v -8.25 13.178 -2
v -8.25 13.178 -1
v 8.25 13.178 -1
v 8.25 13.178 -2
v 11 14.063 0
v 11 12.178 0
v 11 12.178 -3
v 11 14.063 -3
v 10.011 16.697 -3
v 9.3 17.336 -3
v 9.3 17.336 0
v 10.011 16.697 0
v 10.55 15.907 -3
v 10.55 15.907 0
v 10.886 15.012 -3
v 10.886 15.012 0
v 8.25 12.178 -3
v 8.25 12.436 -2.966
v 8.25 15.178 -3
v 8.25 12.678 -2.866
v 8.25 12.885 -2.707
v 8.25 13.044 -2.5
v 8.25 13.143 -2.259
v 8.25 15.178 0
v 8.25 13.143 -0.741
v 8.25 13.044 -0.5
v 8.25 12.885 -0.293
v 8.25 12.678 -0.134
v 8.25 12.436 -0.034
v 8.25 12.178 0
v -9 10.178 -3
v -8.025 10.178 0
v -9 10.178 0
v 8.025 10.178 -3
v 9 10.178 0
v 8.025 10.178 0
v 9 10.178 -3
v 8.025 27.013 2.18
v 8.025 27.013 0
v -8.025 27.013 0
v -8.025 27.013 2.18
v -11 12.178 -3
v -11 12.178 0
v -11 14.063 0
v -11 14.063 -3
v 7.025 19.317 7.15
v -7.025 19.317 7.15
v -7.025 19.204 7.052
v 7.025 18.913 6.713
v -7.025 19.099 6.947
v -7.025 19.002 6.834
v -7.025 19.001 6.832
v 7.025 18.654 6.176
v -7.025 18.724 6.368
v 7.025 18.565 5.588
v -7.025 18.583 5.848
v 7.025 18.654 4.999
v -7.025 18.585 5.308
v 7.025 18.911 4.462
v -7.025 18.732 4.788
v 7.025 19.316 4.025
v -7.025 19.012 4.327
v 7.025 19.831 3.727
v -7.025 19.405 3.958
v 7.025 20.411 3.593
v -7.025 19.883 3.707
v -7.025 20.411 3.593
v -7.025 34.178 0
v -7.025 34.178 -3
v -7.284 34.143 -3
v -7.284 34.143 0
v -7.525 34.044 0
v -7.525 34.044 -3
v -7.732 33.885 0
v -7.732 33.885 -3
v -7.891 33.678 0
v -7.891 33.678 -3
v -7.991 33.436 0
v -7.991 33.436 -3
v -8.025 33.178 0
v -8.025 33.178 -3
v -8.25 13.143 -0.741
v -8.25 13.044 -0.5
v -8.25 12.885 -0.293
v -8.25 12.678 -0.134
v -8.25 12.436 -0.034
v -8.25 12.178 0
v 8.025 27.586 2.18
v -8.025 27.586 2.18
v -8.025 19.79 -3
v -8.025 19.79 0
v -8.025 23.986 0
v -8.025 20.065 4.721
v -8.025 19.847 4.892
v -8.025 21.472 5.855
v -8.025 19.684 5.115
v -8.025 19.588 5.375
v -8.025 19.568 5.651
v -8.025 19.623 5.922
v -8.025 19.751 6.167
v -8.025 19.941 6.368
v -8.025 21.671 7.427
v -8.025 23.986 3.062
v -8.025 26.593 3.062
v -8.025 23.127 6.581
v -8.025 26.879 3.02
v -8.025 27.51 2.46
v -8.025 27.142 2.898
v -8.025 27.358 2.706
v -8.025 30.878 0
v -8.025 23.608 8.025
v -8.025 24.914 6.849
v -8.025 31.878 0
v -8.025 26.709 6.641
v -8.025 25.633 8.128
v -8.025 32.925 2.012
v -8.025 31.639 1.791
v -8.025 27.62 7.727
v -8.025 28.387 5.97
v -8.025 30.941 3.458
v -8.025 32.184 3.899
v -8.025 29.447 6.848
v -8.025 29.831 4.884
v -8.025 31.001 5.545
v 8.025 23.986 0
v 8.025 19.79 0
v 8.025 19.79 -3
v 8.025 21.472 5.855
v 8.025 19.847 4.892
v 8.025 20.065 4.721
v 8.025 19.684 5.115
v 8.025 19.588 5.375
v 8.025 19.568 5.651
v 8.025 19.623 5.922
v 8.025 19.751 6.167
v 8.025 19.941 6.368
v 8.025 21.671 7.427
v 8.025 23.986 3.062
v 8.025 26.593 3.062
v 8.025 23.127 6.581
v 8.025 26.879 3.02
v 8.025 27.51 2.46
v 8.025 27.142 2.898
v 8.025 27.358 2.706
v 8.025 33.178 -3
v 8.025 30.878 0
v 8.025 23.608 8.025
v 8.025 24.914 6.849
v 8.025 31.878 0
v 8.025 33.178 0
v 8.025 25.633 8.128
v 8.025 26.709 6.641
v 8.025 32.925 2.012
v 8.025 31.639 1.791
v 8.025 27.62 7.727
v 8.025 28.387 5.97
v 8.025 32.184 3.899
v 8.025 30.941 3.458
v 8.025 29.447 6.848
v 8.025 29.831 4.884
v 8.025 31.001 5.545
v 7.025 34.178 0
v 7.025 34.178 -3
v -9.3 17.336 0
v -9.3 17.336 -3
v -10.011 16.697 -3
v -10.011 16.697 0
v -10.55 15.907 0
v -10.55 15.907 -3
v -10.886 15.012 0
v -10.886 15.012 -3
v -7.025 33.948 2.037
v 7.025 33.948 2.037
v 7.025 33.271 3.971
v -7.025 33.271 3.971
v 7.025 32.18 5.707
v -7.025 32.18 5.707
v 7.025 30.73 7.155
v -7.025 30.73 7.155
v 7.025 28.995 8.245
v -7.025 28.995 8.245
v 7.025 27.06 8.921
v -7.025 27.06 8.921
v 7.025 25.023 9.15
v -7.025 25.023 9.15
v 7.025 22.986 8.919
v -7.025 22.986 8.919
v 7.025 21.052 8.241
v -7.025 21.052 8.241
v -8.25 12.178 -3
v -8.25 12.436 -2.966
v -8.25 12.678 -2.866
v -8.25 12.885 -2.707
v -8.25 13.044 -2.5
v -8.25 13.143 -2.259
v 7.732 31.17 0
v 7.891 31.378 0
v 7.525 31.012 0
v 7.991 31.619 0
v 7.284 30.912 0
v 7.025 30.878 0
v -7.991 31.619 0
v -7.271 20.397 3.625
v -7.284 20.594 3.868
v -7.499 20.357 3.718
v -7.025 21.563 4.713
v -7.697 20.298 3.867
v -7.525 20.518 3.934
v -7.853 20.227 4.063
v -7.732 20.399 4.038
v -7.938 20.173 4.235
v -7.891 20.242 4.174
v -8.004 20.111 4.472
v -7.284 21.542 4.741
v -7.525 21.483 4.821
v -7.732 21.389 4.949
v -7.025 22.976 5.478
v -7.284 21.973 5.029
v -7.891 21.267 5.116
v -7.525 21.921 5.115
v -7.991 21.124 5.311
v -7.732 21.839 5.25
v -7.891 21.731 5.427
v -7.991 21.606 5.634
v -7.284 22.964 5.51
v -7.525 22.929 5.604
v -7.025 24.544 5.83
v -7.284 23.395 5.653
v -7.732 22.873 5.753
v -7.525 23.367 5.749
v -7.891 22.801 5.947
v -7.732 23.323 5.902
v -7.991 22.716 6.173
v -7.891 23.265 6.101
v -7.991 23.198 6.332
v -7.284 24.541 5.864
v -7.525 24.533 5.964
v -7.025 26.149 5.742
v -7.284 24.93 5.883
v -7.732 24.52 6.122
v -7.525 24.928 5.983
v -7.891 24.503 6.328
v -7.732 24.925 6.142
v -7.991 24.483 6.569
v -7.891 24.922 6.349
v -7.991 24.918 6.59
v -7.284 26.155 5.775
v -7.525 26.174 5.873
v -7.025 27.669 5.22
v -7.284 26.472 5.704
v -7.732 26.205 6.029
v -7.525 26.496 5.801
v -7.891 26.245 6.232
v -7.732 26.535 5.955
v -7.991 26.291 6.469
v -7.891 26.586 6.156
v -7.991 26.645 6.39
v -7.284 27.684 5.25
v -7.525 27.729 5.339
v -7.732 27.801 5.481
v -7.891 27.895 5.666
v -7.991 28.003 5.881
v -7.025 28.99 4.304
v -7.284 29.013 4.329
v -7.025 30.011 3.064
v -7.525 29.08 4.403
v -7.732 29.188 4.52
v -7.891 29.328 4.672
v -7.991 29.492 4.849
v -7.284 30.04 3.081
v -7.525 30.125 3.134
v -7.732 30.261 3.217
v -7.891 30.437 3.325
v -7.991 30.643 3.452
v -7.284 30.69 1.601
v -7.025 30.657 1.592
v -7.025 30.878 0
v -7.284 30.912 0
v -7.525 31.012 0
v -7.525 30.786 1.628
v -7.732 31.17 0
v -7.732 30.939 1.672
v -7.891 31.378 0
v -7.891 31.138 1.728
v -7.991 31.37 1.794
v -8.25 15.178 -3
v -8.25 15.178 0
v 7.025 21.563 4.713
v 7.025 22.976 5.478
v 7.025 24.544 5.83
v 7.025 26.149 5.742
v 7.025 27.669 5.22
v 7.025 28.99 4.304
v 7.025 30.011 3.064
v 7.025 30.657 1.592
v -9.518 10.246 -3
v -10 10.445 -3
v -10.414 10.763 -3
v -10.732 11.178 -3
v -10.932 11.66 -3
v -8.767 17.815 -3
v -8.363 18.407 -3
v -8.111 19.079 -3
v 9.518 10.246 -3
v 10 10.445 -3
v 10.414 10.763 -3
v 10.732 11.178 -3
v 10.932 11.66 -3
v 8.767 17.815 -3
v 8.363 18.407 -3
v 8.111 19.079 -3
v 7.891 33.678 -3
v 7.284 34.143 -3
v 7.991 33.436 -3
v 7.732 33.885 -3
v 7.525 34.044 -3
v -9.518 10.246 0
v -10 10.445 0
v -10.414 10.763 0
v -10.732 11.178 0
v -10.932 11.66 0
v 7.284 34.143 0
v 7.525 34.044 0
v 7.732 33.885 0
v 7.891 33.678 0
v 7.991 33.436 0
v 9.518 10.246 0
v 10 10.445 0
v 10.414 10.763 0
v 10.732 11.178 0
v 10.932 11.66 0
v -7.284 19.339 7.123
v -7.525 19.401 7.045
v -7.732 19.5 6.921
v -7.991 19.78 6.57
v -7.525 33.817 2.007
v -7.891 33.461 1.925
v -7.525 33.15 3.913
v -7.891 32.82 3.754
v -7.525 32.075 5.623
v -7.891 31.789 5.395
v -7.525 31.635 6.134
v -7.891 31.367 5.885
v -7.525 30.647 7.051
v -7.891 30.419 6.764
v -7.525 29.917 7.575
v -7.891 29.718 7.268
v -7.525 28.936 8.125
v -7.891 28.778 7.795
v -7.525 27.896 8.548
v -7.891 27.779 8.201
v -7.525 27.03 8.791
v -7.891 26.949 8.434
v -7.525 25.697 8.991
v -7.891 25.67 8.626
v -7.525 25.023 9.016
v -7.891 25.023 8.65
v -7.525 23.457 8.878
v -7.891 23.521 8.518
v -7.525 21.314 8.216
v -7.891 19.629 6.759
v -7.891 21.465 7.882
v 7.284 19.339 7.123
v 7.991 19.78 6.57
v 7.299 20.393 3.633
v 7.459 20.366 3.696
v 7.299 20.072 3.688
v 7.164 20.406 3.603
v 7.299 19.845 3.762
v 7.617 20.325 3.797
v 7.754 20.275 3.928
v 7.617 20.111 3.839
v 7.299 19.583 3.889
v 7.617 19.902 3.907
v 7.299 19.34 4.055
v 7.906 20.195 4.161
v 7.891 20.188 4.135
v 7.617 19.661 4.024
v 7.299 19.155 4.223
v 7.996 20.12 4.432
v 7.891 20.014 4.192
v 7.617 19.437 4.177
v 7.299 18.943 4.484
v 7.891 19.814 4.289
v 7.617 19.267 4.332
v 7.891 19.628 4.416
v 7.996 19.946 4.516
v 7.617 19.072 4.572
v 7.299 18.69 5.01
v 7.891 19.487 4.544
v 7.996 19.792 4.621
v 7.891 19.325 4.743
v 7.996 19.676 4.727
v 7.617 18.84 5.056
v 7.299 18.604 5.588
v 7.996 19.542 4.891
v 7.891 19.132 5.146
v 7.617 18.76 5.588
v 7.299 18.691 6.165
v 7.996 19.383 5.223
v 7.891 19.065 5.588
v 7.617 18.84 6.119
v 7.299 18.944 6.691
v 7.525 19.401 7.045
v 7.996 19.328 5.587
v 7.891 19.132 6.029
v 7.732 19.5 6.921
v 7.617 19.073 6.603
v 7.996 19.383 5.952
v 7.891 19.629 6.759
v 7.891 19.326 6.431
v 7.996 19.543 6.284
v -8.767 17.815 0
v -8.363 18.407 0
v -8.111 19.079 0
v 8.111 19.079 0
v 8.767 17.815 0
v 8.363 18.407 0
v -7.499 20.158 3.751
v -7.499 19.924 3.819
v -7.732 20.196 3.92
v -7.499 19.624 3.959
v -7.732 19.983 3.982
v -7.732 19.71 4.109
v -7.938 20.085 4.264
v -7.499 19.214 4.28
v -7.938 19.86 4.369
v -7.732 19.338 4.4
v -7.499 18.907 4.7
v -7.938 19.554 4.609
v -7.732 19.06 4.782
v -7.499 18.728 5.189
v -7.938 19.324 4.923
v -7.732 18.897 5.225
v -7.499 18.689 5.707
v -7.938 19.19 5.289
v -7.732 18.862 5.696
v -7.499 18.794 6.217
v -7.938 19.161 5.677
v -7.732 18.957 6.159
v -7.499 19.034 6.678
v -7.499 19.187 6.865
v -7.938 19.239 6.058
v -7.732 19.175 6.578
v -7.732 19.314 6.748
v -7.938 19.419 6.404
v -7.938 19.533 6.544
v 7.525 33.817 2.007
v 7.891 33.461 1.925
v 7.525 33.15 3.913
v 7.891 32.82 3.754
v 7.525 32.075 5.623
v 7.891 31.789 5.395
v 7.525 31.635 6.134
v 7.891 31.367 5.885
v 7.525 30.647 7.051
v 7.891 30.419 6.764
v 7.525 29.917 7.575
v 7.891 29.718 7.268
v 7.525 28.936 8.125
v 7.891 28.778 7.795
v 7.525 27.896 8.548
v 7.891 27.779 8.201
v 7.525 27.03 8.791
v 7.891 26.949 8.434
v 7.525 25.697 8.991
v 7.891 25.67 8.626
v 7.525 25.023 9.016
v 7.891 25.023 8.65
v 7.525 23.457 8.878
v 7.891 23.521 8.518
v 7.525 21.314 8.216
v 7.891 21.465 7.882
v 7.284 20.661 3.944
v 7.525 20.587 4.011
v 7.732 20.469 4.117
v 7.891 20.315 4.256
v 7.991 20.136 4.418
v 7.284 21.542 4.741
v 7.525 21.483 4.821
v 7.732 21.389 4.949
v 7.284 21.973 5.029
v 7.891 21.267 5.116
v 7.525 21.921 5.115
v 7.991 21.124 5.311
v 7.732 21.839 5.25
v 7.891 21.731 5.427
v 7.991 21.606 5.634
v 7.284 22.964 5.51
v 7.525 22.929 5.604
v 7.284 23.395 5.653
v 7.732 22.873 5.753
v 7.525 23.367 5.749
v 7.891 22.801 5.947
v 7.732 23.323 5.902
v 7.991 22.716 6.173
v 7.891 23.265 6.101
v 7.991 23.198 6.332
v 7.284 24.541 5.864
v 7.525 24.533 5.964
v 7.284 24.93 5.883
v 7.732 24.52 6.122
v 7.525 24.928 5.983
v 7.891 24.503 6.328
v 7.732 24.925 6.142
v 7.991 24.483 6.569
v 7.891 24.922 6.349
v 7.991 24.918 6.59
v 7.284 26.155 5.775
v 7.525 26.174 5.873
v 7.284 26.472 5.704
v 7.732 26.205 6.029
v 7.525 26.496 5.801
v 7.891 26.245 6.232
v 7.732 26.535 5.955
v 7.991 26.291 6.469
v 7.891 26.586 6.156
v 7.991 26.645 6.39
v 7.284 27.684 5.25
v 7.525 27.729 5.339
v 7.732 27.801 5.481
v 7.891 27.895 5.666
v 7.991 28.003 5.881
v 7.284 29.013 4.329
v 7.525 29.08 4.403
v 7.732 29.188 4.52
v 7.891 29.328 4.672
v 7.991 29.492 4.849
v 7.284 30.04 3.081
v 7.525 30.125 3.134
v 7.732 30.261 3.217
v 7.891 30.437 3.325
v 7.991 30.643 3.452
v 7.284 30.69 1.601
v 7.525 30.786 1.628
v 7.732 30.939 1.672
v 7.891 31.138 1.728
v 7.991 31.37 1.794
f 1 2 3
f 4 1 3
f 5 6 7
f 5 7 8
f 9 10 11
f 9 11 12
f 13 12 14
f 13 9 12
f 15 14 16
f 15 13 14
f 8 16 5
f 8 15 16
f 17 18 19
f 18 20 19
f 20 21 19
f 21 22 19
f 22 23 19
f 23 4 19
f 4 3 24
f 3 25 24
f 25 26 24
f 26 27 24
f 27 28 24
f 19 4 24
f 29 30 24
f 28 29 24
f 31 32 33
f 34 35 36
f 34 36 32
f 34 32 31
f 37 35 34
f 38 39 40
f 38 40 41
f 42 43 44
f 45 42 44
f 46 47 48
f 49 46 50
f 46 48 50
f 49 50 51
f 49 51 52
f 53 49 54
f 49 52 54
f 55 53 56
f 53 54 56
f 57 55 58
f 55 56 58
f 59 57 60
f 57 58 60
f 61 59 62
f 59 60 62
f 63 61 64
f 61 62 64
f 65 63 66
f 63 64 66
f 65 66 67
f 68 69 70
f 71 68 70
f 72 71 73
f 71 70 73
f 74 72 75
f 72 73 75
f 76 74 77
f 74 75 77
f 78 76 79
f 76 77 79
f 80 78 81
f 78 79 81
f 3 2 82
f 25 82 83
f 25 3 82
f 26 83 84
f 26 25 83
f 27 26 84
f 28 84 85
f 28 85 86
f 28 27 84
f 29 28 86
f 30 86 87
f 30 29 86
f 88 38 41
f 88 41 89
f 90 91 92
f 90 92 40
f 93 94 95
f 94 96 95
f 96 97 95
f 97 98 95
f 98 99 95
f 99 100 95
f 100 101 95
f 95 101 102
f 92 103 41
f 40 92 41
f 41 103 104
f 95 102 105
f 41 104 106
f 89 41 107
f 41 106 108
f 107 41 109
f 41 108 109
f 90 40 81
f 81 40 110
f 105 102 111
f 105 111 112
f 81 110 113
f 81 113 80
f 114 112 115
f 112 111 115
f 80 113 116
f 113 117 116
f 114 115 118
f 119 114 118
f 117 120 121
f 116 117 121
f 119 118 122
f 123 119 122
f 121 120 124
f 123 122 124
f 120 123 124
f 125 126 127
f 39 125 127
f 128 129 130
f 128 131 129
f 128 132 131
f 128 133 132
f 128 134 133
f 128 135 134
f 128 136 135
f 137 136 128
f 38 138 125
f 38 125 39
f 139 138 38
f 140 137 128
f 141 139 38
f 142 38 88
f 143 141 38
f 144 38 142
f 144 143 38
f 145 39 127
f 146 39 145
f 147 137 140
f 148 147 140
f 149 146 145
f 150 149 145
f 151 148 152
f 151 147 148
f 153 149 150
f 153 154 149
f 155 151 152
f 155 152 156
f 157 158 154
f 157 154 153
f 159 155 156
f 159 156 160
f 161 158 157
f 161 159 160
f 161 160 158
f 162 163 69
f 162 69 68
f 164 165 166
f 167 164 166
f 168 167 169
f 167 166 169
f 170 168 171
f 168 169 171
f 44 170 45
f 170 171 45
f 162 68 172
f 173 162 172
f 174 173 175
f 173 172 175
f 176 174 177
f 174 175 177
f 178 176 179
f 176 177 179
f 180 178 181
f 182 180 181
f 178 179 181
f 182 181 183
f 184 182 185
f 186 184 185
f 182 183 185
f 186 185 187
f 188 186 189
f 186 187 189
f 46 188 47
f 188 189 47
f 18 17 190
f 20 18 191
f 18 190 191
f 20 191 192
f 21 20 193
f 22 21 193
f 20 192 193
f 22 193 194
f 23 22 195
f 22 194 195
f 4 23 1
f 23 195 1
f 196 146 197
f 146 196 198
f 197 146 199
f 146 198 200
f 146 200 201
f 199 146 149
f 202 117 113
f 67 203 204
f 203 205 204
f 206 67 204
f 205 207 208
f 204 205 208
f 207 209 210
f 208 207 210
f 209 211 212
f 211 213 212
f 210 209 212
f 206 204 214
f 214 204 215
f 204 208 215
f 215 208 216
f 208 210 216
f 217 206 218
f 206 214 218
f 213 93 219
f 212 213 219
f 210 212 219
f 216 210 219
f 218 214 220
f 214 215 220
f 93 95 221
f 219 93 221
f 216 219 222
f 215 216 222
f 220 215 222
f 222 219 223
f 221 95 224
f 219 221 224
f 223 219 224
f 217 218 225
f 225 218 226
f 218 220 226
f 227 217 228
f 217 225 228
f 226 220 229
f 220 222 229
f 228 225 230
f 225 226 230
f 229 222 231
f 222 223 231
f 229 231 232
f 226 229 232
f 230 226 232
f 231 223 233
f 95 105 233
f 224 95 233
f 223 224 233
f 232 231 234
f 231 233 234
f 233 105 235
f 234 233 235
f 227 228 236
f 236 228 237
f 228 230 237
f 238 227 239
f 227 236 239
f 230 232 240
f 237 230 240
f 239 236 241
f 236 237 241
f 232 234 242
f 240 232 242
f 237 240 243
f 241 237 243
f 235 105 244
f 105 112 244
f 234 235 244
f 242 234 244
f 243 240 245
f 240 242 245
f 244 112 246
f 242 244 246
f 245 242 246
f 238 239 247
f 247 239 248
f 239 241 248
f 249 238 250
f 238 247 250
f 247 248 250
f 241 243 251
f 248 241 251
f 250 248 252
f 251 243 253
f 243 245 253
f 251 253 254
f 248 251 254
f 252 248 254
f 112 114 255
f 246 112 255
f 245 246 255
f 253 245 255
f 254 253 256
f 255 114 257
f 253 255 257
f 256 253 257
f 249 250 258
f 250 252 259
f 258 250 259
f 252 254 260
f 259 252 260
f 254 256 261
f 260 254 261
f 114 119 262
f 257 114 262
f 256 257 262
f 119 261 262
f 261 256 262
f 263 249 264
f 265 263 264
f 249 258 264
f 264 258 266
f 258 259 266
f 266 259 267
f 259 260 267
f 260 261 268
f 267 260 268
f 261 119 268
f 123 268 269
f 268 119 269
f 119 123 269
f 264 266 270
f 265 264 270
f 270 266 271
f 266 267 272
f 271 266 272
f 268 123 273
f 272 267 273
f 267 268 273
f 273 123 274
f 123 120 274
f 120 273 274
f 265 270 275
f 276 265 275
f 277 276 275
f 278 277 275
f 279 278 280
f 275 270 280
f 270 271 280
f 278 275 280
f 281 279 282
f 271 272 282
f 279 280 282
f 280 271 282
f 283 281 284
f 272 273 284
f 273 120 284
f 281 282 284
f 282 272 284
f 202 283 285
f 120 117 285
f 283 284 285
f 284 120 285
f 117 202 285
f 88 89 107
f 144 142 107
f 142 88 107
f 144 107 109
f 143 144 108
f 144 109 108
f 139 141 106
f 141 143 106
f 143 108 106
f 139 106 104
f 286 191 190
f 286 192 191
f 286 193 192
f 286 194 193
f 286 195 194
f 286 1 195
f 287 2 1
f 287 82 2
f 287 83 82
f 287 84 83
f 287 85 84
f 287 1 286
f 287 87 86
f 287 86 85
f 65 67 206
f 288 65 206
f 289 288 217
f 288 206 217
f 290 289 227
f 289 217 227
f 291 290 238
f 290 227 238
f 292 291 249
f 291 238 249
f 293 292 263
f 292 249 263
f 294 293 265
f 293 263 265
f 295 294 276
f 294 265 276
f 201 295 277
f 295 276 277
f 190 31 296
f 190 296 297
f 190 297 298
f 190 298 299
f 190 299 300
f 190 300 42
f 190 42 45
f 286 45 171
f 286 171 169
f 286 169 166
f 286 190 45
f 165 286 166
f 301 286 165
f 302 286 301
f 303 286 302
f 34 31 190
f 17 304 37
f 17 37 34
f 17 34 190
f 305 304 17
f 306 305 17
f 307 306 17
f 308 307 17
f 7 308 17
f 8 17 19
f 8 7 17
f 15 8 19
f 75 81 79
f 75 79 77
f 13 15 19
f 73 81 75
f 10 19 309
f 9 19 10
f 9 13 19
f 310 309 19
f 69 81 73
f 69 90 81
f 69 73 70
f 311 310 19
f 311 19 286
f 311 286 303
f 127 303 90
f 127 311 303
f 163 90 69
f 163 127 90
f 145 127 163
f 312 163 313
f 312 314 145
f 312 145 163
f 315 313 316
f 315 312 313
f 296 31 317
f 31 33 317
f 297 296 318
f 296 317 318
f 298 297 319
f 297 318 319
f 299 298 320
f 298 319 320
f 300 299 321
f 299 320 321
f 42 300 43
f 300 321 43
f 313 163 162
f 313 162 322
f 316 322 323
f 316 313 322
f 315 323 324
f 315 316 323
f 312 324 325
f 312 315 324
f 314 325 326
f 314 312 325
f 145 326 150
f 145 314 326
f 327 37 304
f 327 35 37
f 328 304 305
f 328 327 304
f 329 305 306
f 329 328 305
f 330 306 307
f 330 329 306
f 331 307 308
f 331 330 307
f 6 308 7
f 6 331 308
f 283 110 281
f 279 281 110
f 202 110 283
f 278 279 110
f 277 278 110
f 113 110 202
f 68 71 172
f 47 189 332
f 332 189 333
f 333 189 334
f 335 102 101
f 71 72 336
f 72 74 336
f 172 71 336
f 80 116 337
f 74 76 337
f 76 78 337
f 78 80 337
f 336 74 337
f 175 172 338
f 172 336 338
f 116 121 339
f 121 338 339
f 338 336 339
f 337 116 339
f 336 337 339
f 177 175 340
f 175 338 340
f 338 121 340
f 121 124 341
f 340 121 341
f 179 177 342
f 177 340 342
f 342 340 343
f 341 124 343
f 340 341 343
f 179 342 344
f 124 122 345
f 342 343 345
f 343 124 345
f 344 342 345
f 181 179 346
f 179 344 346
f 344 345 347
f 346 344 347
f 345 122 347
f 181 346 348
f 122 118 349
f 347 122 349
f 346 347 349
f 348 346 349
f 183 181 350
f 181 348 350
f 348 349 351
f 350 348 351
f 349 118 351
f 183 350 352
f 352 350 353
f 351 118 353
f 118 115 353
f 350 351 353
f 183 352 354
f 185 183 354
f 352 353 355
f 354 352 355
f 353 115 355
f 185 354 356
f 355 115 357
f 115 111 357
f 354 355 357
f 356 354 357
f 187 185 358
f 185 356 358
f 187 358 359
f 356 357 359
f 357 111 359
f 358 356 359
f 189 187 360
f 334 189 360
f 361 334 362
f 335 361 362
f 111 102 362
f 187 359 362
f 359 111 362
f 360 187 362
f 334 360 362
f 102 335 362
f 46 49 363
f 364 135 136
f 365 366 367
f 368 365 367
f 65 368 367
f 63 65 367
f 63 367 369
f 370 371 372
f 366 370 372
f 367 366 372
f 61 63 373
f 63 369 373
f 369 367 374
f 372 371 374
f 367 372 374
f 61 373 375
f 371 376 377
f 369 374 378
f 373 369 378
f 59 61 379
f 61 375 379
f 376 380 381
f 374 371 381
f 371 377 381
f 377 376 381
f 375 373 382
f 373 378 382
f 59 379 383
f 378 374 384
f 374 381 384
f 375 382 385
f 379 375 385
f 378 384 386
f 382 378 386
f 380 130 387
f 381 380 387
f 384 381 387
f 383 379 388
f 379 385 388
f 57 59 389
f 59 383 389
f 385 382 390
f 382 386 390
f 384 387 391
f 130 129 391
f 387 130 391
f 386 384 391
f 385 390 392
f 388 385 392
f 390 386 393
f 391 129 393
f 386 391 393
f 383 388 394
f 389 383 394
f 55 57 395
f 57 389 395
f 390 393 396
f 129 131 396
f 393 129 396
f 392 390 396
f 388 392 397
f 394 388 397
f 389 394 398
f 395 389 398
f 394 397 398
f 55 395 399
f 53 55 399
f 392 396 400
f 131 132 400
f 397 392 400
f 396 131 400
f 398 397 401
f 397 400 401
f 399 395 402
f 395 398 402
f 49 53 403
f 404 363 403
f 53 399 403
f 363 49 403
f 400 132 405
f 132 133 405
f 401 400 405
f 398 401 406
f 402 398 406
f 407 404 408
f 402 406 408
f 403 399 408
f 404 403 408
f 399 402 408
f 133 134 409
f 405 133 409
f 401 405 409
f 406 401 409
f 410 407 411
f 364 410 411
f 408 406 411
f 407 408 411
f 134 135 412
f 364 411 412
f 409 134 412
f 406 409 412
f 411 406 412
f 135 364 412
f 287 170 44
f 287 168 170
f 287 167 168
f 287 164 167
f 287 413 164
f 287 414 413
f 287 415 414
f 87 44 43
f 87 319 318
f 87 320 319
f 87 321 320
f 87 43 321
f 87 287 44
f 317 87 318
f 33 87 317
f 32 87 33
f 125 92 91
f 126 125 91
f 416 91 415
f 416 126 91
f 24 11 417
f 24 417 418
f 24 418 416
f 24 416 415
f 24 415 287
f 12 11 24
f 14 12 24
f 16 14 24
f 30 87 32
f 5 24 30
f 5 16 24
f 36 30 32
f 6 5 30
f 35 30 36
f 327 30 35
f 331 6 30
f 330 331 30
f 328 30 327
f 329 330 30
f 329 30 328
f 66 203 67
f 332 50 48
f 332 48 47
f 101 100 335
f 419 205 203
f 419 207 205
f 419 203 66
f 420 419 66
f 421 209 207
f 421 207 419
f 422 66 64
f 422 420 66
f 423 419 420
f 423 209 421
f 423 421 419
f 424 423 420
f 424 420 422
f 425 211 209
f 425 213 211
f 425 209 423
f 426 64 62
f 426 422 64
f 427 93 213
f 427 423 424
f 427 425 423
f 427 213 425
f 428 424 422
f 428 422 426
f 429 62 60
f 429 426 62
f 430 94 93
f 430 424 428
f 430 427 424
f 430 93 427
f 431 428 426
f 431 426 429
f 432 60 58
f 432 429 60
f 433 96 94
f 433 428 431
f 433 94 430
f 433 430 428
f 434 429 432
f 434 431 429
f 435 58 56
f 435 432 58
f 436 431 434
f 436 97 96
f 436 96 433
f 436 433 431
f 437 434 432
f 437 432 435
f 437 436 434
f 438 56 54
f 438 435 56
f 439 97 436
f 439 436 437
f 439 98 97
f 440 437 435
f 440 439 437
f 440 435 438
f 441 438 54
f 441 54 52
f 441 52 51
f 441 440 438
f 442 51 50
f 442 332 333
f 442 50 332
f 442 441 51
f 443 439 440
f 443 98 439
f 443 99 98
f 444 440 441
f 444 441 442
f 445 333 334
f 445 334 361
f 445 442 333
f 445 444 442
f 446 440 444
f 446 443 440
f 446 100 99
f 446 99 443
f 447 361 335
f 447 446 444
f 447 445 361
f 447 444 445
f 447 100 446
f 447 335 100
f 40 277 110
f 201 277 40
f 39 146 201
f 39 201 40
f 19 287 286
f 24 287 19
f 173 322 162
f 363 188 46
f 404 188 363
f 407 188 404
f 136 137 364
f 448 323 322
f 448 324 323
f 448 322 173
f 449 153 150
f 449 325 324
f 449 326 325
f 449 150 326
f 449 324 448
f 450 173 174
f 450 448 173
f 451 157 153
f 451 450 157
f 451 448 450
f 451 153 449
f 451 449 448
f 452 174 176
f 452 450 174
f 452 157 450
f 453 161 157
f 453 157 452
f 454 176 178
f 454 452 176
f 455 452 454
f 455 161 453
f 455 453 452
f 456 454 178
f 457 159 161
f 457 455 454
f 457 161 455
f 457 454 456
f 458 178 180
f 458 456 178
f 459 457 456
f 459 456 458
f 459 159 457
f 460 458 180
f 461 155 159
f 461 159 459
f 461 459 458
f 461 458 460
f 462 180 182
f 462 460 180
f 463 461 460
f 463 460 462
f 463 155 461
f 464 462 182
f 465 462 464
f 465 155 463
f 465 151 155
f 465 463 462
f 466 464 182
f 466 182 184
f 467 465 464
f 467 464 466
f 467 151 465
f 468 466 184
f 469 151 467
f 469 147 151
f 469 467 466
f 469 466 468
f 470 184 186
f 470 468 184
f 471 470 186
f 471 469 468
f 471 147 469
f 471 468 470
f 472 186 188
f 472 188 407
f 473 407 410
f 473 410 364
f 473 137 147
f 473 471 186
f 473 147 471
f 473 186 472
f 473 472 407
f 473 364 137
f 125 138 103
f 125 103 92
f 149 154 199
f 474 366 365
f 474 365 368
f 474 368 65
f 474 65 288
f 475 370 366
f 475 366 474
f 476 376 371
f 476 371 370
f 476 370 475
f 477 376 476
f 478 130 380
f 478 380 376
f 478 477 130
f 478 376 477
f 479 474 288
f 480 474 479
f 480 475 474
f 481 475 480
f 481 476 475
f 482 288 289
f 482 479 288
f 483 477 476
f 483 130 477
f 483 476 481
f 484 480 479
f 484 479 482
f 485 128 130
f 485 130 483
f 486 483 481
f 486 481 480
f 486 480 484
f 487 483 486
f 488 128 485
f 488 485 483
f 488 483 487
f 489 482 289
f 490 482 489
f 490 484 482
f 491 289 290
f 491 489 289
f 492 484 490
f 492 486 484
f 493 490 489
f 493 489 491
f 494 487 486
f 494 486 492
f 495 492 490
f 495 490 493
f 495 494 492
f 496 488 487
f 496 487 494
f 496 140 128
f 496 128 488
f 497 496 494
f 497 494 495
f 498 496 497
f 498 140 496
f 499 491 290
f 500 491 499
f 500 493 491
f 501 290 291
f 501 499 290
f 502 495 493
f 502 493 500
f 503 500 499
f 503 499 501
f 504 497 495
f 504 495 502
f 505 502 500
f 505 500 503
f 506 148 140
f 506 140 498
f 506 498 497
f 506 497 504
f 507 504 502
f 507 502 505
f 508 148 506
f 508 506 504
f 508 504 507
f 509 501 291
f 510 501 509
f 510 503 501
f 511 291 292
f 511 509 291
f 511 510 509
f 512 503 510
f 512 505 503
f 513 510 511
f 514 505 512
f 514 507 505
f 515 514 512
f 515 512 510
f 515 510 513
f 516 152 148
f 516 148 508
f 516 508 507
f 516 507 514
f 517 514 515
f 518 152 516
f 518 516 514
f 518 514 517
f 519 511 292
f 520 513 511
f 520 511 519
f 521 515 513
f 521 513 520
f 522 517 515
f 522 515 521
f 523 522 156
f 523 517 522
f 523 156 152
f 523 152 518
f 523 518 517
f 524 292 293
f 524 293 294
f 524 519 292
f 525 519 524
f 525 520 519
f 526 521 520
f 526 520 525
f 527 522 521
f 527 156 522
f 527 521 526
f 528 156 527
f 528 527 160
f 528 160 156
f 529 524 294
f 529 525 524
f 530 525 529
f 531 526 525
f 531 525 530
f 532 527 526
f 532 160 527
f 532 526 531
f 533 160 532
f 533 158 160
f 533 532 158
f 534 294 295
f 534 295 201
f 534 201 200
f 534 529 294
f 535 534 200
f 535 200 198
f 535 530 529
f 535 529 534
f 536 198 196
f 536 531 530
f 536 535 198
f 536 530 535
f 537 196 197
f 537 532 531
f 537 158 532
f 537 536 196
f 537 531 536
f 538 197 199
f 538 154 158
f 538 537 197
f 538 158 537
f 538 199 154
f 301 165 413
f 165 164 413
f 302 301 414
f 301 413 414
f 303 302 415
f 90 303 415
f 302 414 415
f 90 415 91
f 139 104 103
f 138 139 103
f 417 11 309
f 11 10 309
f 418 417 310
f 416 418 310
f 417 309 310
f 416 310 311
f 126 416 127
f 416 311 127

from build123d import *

# Parameters (mm, degrees)
F3_DEPTH       = 16.05
F4_W           = 5.4241176695
F4_H           = 3.5927895224
F5_DEPTH       = 25
F5_DEPTH_BACK  = 25
F6_T1_DEPTH    = 38.39224199
F8_DEPTH       = 8.025
F8_DEPTH_BACK  = 8.025
F9_T1_DEPTH    = 21.0152154422
F11_W          = 7.7522003338
F11_H          = 3
F12_DEPTH      = 11
F12_DEPTH_BACK = 11
F13_W          = 16.5
F13_H          = 2
F14_DEPTH      = 25
F15_R          = 1
F16_T1_DEPTH   = 22.3322108151
F17_T3_ANGLE   = 128.6137584612
F17_T6_ANGLE   = 128.6137584612
F17_T9_ANGLE   = 166.6195765903
F17_T12_ANGLE  = 166.6195765903
F17_T15_ANGLE  = 208.6372867238
F17_T18_ANGLE  = 208.6372867238
F17_T21_DEPTH  = 5.5
F17_T24_DEPTH  = 5.5
F18_R          = 2
F19_R          = 3


# Not quite as in the source:
# - a fillet or chamfer that OpenCascade refuses, or shapes differently, is made with other operations: its cross-section is extruded or revolved along the edge and cut away or added


with BuildPart() as f3:
    # F2 (on line) → F3 (new body)
    with BuildSketch(Plane.YZ.offset(-8.025)):
        with BuildLine():
            Line((30.8775485963, 0), (34.1775485963, 0))
            ThreePointArc((34.1775485963, 0), (25.0275485963, 9.15), (15.8775485963, 0))
            Line((15.8775485963, 0), (19.1775485963, 0))
            ThreePointArc((19.1775485963, 0), (25.0275485963, 5.85), (30.8775485963, 0))
        make_face()
    extrude(amount=F3_DEPTH)

    # F4 (on Right) → F5 (cut, two sides)
    with BuildSketch(Plane.YZ) as f5_sk:
        with Locations((17.9089335725, 1.7963947612)):
            Rectangle(F4_W, F4_H)
    extrude(amount=-F5_DEPTH, mode=Mode.SUBTRACT)
    extrude(f5_sk.sketch, amount=F5_DEPTH_BACK, mode=Mode.SUBTRACT)

    # F6: fillet of radius 2 on 1 edges, made by hand

    # F6_s2 → F6_t1 (cut)
    with BuildSketch(Plane.YZ.offset(-19.196120995)):
        with BuildLine():
            ThreePointArc((19.3173332992, 7.1495413322), (18.6537711345, 4.9990791235), (20.4108004498, 3.5927895224))
            Line((20.4108004498, 3.5927895224), (16.6124215356, 3.5927895224))
            ThreePointArc((16.6124215356, 3.5927895224), (17.7444211746, 5.5388225246), (19.3173332992, 7.1495413322))
        make_face()
    extrude(amount=F6_T1_DEPTH, mode=Mode.SUBTRACT)

    # F7 (on Right) → F8 (join, two sides)
    with BuildSketch(Plane.YZ) as f8_sk:
        Polygon((34.1775485963, 0), (27.0130820572, 0), (23.9856019616, 0), (10.1775485963, 0), (10.1775485963, -3), (34.1775485963, -3), align=None)
        Polygon((23.9856019616, 0), (27.0130820572, 0), (27.0130820572, 2.18), (27.5856019616, 2.18), (27.5856019616, 3.0622484628), (23.9856019616, 3.0622484628), (23.9856019616, 2.18), align=None)
    extrude(amount=F8_DEPTH)
    extrude(f8_sk.sketch, amount=-F8_DEPTH_BACK)

    # F9: fillet of radius 1 on 1 edges, made by hand

    # F9_s2 → F9_t1 (cut)
    with BuildSketch(Plane.YZ.offset(-10.5076077211)):
        with BuildLine():
            ThreePointArc((27.5856019616, 2.18), (27.2567307119, 2.8098284041), (26.5925588732, 3.0622484628))
            Line((26.5925588732, 3.0622484628), (27.5856019616, 3.0622484628))
            Line((27.5856019616, 3.0622484628), (27.5856019616, 2.18))
        make_face()
    extrude(amount=F9_T1_DEPTH, mode=Mode.SUBTRACT)

    # F10: union 

    # F11 (on Right) → F12 (join, two sides)
    with BuildSketch(Plane.YZ) as f12_sk:
        with Locations((14.0536487631, -1.5)):
            Rectangle(F11_W, F11_H)
    extrude(amount=F12_DEPTH)
    extrude(f12_sk.sketch, amount=-F12_DEPTH_BACK)

    # F13 (on Top) → F14 (cut)
    with BuildSketch(Plane.XY):
        with Locations((0, 14.1775485963)):
            Rectangle(F13_W, F13_H)
    extrude(amount=-F14_DEPTH, mode=Mode.SUBTRACT)

    # F15
    f15_edges = [f3.edges().sort_by_distance(p)[0] for p in [
        (0, 13.177549, -3),
        (0, 13.177549, 0),
    ]]
    fillet(f15_edges, radius=F15_R)

    # F16: fillet of radius 4 on 2 edges, made by hand

    # F16_s2 → F16_t1 (cut)
    with BuildSketch(Plane.XY.offset(-12.6661054076)):
        with BuildLine():
            ThreePointArc((-8.025, 17.92974893), (-10.1701734968, 16.5025689505), (-11, 14.063306767))
            Line((-11, 14.063306767), (-11, 17.92974893))
            Line((-11, 17.92974893), (-8.025, 17.92974893))
        make_face()
        with BuildLine():
            ThreePointArc((8.025, 17.92974893), (10.1701734968, 16.5025689505), (11, 14.063306767))
            Line((11, 14.063306767), (11, 17.92974893))
            Line((11, 17.92974893), (8.025, 17.92974893))
        make_face()
    extrude(amount=F16_T1_DEPTH, mode=Mode.SUBTRACT)

    # F17: fillet of radius 1 on 8 edges, made by hand


with BuildPart() as f17_tool1:
    # F17_s2 → F17_t3 (revolve)
    with BuildSketch(Plane.XY):
        with BuildLine():
            ThreePointArc((-7.025, 34.1775485963), (-7.7321067812, 33.8846553774), (-8.025, 33.1775485963))
            Line((-8.025, 33.1775485963), (-8.025, 34.1775485963))
            Line((-8.025, 34.1775485963), (-7.025, 34.1775485963))
        make_face()
    revolve(axis=Axis((-8.025, 25.0275485963, 0), (1, 0, 0)), revolution_arc=F17_T3_ANGLE)


with BuildPart() as f17_tool4:
    # F17_s5 → F17_t6 (revolve)
    with BuildSketch(Plane.XY):
        with BuildLine():
            ThreePointArc((7.025, 34.1775485963), (7.7321067812, 33.8846553774), (8.025, 33.1775485963))
            Line((8.025, 33.1775485963), (8.025, 34.1775485963))
            Line((8.025, 34.1775485963), (7.025, 34.1775485963))
        make_face()
    revolve(axis=Axis((8.025, 25.0275485963, 0), (1, 0, 0)), revolution_arc=F17_T6_ANGLE)


with BuildPart() as f17_tool7:
    # F17_s8 → F17_t9 (revolve)
    with BuildSketch(Plane(origin=(0, 1.3403038382, 5.634545684), x_dir=(1, 0, 0), z_dir=(0, -0.2314155158, -0.9728550041))):
        with BuildLine():
            ThreePointArc((-7.025, -18.4981758925), (-7.7321067812, -18.2052826737), (-8.025, -17.4981758925))
            Line((-8.025, -17.4981758925), (-8.025, -18.4981758925))
            Line((-8.025, -18.4981758925), (-7.025, -18.4981758925))
        make_face()
    revolve(axis=Axis((-8.025, 25.0275485963, 0), (-1, 0, 0)), revolution_arc=F17_T9_ANGLE)


with BuildPart() as f17_tool10:
    # F17_s11 → F17_t12 (revolve)
    with BuildSketch(Plane(origin=(0, 1.3403038382, 5.634545684), x_dir=(1, 0, 0), z_dir=(0, -0.2314155158, -0.9728550041))):
        with BuildLine():
            ThreePointArc((7.025, -18.4981758925), (7.7321067812, -18.2052826737), (8.025, -17.4981758925))
            Line((8.025, -17.4981758925), (8.025, -18.4981758925))
            Line((8.025, -18.4981758925), (7.025, -18.4981758925))
        make_face()
    revolve(axis=Axis((8.025, 25.0275485963, 0), (-1, 0, 0)), revolution_arc=F17_T12_ANGLE)


with BuildPart() as f17_tool13:
    # F17_s14 → F17_t15 (revolve)
    with BuildSketch(Plane(origin=(0, 5.0675252641, 12.0852942927), x_dir=(1, 0, 0), z_dir=(0, 0.3866941389, 0.9222080259))):
        with BuildLine():
            ThreePointArc((-7.025, 18.8052566142), (-7.7321067812, 18.5123633954), (-8.025, 17.8052566142))
            Line((-8.025, 17.8052566142), (-8.025, 18.8052566142))
            Line((-8.025, 18.8052566142), (-7.025, 18.8052566142))
        make_face()
    revolve(axis=Axis((-8.025, 20.5654677903, 5.5868000574), (-1, 0, 0)), revolution_arc=F17_T15_ANGLE)


with BuildPart() as f17_tool16:
    # F17_s17 → F17_t18 (revolve)
    with BuildSketch(Plane(origin=(0, 5.0675252641, 12.0852942927), x_dir=(1, 0, 0), z_dir=(0, 0.3866941389, 0.9222080259))):
        with BuildLine():
            ThreePointArc((7.025, 18.8052566142), (7.7321067812, 18.5123633954), (8.025, 17.8052566142))
            Line((8.025, 17.8052566142), (8.025, 18.8052566142))
            Line((8.025, 18.8052566142), (7.025, 18.8052566142))
        make_face()
    revolve(axis=Axis((8.025, 20.5654677903, 5.5868000574), (-1, 0, 0)), revolution_arc=F17_T18_ANGLE)


with BuildPart() as f17_tool19:
    # F17_s20 → F17_t21 (new body)
    with BuildSketch(Plane.XY.offset(-5.5)):
        with BuildLine():
            ThreePointArc((7.025, 34.1775485963), (7.7321067812, 33.8846553774), (8.025, 33.1775485963))
            Line((8.025, 33.1775485963), (8.025, 34.1775485963))
            Line((8.025, 34.1775485963), (7.025, 34.1775485963))
        make_face()
    extrude(amount=F17_T21_DEPTH)


with BuildPart() as f17_tool22:
    # F17_s23 → F17_t24 (new body)
    with BuildSketch(Plane.XY.offset(-5.5)):
        with BuildLine():
            ThreePointArc((-7.025, 34.1775485963), (-7.7321067812, 33.8846553774), (-8.025, 33.1775485963))
            Line((-8.025, 33.1775485963), (-8.025, 34.1775485963))
            Line((-8.025, 34.1775485963), (-7.025, 34.1775485963))
        make_face()
    extrude(amount=F17_T24_DEPTH)


with BuildPart() as f3_1:
    add(f3.part)

    # F17_t25: cut F17_tool1, F17_tool4, F17_tool7, F17_tool10, F17_tool13, F17_tool16, F17_tool19, F17_tool22
    add([f17_tool1.part, f17_tool4.part, f17_tool7.part, f17_tool10.part, f17_tool13.part, f17_tool16.part, f17_tool19.part, f17_tool22.part], mode=Mode.SUBTRACT)

    # F18
    f18_edges = [f3_1.edges().sort_by_distance(p)[0] for p in [
        (-11, 10.177549, -1.5),
        (11, 10.177549, -1.5),
    ]]
    fillet(f18_edges, radius=F18_R)

    # F19
    f19_edges = [f3_1.edges().sort_by_distance(p)[0] for p in [
        (-8.025, 17.929749, -1.5),
        (8.025, 17.929749, -1.5),
    ]]
    fillet(f19_edges, radius=F19_R)


solid = f3_1.part
